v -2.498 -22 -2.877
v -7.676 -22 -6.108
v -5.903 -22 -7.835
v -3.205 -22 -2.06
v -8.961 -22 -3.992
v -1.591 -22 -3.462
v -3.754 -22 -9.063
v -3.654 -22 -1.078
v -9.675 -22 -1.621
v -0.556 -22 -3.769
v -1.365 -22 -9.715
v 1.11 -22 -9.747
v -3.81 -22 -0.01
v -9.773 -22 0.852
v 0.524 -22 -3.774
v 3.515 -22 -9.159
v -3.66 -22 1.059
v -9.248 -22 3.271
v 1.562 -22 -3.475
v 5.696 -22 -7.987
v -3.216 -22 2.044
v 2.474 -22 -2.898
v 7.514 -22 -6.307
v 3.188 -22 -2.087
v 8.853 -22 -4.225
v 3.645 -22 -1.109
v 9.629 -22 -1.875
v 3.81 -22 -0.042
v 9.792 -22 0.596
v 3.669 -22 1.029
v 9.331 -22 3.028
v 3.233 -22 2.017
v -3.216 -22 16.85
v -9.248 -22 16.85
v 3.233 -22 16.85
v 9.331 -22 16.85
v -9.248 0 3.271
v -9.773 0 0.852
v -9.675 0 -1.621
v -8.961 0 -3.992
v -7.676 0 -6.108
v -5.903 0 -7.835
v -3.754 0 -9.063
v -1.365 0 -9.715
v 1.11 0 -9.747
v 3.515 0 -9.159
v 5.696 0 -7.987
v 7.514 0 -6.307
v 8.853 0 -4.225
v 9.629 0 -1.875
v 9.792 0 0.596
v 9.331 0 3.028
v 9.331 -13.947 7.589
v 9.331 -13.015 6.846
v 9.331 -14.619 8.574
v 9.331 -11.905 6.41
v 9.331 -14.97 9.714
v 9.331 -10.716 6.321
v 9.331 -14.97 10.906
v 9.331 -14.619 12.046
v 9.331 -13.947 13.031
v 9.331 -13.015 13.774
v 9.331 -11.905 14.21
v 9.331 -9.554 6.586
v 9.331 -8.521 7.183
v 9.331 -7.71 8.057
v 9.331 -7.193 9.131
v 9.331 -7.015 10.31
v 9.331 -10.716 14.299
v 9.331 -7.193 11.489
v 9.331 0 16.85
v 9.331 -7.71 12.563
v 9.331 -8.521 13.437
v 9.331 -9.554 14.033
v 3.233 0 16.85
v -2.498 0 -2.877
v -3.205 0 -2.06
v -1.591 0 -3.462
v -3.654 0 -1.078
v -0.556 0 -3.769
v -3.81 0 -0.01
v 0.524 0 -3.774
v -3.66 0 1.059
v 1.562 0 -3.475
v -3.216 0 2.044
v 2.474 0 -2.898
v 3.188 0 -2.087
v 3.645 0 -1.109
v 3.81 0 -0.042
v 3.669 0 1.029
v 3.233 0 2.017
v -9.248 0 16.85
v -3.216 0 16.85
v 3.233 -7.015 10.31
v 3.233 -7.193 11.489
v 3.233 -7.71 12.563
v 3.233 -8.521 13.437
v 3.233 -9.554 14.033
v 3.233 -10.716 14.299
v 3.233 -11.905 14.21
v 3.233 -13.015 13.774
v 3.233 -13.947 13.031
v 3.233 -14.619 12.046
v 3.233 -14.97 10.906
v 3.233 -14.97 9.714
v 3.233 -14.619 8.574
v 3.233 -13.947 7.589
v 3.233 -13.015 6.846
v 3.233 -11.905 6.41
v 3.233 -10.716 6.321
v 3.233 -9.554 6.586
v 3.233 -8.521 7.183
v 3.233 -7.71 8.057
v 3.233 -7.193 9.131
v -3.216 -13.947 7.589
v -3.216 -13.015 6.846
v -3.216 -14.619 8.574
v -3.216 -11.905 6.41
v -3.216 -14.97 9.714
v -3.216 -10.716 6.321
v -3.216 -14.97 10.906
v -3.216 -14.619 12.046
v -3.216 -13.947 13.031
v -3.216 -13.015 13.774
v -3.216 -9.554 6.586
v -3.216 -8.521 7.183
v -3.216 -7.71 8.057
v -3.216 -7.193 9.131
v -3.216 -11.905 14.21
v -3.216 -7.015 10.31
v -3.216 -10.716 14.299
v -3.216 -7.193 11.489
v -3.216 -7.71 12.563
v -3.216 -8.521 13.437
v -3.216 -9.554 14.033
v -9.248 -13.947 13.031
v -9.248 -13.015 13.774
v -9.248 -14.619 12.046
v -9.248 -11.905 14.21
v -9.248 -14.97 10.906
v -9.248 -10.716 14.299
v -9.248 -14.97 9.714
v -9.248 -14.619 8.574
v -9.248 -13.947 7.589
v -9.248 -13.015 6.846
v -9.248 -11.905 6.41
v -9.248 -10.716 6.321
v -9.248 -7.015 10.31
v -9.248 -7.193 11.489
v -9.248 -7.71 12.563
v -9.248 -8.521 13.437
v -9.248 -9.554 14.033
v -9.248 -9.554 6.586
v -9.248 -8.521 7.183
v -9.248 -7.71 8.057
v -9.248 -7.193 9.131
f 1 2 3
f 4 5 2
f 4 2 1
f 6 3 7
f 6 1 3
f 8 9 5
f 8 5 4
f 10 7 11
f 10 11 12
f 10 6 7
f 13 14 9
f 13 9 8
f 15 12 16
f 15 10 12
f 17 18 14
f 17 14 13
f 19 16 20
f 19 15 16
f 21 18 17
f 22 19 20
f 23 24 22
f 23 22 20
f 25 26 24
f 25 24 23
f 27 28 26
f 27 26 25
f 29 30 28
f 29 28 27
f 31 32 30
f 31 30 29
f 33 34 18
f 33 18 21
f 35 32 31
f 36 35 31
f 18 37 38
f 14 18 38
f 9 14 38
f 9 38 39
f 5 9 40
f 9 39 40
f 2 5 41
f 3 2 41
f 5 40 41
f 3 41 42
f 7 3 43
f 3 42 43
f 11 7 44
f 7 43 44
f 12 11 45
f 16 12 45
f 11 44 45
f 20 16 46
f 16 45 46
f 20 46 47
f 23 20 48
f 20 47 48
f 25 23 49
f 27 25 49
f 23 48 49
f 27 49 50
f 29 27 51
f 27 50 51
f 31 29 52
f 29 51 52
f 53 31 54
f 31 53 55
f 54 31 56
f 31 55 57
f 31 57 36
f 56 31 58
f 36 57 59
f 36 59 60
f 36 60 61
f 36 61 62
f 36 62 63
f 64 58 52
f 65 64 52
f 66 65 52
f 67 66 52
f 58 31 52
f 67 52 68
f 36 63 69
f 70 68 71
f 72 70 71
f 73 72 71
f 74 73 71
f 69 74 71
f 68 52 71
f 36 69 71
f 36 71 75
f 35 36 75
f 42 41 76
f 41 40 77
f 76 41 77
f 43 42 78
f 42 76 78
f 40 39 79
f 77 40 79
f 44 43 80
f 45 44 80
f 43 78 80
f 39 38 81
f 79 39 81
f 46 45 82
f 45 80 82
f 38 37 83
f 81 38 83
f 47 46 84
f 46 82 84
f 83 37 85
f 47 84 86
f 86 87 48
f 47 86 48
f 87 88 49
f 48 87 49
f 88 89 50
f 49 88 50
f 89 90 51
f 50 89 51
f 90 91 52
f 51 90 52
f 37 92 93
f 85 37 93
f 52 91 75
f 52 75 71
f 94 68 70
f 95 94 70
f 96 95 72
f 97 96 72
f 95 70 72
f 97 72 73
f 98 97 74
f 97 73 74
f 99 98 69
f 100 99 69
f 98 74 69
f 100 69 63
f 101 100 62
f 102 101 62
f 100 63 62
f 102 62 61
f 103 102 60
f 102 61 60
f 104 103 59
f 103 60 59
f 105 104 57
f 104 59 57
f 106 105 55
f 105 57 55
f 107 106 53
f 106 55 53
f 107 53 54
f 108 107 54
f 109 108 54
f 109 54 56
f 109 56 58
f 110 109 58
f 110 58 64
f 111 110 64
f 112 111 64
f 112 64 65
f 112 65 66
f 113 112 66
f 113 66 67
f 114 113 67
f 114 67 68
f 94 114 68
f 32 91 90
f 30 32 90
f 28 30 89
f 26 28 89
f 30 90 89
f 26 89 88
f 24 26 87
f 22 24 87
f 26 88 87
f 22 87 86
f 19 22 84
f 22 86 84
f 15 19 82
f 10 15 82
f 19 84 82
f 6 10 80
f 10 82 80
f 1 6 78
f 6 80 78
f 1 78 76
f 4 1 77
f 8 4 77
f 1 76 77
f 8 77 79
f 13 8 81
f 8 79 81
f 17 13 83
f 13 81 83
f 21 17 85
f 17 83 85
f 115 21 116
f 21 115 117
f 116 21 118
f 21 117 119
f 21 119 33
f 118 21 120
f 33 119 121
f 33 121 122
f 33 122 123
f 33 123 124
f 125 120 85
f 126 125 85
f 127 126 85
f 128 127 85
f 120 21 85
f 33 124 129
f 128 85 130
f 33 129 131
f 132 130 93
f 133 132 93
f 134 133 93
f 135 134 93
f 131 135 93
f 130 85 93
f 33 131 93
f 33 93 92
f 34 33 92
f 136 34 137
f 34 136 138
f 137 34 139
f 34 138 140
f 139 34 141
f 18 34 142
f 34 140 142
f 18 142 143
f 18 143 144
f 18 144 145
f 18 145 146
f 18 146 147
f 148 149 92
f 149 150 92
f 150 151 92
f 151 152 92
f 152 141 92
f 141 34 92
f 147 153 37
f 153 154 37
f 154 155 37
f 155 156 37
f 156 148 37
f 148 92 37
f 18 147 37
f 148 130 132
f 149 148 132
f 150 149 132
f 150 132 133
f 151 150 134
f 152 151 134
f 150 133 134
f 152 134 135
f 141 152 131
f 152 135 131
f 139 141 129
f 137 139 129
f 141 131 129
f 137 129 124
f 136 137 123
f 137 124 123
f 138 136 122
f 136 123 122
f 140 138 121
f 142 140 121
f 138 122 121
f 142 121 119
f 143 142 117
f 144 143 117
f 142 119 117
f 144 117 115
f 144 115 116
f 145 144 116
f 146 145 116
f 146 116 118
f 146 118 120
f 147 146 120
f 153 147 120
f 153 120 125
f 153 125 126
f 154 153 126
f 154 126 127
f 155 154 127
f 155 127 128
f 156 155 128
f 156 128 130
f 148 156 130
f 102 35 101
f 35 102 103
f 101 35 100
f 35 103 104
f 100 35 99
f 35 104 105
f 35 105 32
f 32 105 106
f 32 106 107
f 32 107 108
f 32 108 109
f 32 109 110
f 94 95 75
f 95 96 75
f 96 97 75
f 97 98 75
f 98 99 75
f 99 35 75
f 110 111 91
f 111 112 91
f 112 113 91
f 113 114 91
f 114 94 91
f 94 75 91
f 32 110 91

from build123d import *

# Parameters (mm, degrees)
F1_DEPTH = 22
F2_R     = 4
F3_DEPTH = 18.579489


with BuildPart() as f1:
    # F0 (on Front) → F1 (new body)
    with BuildSketch(Plane.XZ):
        with BuildLine():
            ThreePointArc((3.232615, 2.016507), (-0.015975, -3.809967), (-3.215592, 2.043544))
            Line((-3.215592, 2.043544), (-3.215592, 16.849984))
            Line((-3.215592, 16.849984), (-9.248437, 16.849984))
            Line((-9.248437, 16.849984), (-9.248437, 3.271468))
            ThreePointArc((-9.248437, 3.271468), (-0.128645, -9.809156), (9.331051, 3.027802))
            Line((9.331051, 3.027802), (9.331051, 16.849984))
            Line((9.331051, 16.849984), (3.232615, 16.849984))
            Line((3.232615, 16.849984), (3.232615, 2.016507))
        make_face()
    extrude(amount=F1_DEPTH)

    # F2 (on face) → F3 (cut, through all)
    with BuildSketch(Plane.YZ.offset(9.331051)):
        with Locations((-11.015, 10.309984)):
            Circle(F2_R)
    extrude(amount=-F3_DEPTH, mode=Mode.SUBTRACT)


solid = f1.part
